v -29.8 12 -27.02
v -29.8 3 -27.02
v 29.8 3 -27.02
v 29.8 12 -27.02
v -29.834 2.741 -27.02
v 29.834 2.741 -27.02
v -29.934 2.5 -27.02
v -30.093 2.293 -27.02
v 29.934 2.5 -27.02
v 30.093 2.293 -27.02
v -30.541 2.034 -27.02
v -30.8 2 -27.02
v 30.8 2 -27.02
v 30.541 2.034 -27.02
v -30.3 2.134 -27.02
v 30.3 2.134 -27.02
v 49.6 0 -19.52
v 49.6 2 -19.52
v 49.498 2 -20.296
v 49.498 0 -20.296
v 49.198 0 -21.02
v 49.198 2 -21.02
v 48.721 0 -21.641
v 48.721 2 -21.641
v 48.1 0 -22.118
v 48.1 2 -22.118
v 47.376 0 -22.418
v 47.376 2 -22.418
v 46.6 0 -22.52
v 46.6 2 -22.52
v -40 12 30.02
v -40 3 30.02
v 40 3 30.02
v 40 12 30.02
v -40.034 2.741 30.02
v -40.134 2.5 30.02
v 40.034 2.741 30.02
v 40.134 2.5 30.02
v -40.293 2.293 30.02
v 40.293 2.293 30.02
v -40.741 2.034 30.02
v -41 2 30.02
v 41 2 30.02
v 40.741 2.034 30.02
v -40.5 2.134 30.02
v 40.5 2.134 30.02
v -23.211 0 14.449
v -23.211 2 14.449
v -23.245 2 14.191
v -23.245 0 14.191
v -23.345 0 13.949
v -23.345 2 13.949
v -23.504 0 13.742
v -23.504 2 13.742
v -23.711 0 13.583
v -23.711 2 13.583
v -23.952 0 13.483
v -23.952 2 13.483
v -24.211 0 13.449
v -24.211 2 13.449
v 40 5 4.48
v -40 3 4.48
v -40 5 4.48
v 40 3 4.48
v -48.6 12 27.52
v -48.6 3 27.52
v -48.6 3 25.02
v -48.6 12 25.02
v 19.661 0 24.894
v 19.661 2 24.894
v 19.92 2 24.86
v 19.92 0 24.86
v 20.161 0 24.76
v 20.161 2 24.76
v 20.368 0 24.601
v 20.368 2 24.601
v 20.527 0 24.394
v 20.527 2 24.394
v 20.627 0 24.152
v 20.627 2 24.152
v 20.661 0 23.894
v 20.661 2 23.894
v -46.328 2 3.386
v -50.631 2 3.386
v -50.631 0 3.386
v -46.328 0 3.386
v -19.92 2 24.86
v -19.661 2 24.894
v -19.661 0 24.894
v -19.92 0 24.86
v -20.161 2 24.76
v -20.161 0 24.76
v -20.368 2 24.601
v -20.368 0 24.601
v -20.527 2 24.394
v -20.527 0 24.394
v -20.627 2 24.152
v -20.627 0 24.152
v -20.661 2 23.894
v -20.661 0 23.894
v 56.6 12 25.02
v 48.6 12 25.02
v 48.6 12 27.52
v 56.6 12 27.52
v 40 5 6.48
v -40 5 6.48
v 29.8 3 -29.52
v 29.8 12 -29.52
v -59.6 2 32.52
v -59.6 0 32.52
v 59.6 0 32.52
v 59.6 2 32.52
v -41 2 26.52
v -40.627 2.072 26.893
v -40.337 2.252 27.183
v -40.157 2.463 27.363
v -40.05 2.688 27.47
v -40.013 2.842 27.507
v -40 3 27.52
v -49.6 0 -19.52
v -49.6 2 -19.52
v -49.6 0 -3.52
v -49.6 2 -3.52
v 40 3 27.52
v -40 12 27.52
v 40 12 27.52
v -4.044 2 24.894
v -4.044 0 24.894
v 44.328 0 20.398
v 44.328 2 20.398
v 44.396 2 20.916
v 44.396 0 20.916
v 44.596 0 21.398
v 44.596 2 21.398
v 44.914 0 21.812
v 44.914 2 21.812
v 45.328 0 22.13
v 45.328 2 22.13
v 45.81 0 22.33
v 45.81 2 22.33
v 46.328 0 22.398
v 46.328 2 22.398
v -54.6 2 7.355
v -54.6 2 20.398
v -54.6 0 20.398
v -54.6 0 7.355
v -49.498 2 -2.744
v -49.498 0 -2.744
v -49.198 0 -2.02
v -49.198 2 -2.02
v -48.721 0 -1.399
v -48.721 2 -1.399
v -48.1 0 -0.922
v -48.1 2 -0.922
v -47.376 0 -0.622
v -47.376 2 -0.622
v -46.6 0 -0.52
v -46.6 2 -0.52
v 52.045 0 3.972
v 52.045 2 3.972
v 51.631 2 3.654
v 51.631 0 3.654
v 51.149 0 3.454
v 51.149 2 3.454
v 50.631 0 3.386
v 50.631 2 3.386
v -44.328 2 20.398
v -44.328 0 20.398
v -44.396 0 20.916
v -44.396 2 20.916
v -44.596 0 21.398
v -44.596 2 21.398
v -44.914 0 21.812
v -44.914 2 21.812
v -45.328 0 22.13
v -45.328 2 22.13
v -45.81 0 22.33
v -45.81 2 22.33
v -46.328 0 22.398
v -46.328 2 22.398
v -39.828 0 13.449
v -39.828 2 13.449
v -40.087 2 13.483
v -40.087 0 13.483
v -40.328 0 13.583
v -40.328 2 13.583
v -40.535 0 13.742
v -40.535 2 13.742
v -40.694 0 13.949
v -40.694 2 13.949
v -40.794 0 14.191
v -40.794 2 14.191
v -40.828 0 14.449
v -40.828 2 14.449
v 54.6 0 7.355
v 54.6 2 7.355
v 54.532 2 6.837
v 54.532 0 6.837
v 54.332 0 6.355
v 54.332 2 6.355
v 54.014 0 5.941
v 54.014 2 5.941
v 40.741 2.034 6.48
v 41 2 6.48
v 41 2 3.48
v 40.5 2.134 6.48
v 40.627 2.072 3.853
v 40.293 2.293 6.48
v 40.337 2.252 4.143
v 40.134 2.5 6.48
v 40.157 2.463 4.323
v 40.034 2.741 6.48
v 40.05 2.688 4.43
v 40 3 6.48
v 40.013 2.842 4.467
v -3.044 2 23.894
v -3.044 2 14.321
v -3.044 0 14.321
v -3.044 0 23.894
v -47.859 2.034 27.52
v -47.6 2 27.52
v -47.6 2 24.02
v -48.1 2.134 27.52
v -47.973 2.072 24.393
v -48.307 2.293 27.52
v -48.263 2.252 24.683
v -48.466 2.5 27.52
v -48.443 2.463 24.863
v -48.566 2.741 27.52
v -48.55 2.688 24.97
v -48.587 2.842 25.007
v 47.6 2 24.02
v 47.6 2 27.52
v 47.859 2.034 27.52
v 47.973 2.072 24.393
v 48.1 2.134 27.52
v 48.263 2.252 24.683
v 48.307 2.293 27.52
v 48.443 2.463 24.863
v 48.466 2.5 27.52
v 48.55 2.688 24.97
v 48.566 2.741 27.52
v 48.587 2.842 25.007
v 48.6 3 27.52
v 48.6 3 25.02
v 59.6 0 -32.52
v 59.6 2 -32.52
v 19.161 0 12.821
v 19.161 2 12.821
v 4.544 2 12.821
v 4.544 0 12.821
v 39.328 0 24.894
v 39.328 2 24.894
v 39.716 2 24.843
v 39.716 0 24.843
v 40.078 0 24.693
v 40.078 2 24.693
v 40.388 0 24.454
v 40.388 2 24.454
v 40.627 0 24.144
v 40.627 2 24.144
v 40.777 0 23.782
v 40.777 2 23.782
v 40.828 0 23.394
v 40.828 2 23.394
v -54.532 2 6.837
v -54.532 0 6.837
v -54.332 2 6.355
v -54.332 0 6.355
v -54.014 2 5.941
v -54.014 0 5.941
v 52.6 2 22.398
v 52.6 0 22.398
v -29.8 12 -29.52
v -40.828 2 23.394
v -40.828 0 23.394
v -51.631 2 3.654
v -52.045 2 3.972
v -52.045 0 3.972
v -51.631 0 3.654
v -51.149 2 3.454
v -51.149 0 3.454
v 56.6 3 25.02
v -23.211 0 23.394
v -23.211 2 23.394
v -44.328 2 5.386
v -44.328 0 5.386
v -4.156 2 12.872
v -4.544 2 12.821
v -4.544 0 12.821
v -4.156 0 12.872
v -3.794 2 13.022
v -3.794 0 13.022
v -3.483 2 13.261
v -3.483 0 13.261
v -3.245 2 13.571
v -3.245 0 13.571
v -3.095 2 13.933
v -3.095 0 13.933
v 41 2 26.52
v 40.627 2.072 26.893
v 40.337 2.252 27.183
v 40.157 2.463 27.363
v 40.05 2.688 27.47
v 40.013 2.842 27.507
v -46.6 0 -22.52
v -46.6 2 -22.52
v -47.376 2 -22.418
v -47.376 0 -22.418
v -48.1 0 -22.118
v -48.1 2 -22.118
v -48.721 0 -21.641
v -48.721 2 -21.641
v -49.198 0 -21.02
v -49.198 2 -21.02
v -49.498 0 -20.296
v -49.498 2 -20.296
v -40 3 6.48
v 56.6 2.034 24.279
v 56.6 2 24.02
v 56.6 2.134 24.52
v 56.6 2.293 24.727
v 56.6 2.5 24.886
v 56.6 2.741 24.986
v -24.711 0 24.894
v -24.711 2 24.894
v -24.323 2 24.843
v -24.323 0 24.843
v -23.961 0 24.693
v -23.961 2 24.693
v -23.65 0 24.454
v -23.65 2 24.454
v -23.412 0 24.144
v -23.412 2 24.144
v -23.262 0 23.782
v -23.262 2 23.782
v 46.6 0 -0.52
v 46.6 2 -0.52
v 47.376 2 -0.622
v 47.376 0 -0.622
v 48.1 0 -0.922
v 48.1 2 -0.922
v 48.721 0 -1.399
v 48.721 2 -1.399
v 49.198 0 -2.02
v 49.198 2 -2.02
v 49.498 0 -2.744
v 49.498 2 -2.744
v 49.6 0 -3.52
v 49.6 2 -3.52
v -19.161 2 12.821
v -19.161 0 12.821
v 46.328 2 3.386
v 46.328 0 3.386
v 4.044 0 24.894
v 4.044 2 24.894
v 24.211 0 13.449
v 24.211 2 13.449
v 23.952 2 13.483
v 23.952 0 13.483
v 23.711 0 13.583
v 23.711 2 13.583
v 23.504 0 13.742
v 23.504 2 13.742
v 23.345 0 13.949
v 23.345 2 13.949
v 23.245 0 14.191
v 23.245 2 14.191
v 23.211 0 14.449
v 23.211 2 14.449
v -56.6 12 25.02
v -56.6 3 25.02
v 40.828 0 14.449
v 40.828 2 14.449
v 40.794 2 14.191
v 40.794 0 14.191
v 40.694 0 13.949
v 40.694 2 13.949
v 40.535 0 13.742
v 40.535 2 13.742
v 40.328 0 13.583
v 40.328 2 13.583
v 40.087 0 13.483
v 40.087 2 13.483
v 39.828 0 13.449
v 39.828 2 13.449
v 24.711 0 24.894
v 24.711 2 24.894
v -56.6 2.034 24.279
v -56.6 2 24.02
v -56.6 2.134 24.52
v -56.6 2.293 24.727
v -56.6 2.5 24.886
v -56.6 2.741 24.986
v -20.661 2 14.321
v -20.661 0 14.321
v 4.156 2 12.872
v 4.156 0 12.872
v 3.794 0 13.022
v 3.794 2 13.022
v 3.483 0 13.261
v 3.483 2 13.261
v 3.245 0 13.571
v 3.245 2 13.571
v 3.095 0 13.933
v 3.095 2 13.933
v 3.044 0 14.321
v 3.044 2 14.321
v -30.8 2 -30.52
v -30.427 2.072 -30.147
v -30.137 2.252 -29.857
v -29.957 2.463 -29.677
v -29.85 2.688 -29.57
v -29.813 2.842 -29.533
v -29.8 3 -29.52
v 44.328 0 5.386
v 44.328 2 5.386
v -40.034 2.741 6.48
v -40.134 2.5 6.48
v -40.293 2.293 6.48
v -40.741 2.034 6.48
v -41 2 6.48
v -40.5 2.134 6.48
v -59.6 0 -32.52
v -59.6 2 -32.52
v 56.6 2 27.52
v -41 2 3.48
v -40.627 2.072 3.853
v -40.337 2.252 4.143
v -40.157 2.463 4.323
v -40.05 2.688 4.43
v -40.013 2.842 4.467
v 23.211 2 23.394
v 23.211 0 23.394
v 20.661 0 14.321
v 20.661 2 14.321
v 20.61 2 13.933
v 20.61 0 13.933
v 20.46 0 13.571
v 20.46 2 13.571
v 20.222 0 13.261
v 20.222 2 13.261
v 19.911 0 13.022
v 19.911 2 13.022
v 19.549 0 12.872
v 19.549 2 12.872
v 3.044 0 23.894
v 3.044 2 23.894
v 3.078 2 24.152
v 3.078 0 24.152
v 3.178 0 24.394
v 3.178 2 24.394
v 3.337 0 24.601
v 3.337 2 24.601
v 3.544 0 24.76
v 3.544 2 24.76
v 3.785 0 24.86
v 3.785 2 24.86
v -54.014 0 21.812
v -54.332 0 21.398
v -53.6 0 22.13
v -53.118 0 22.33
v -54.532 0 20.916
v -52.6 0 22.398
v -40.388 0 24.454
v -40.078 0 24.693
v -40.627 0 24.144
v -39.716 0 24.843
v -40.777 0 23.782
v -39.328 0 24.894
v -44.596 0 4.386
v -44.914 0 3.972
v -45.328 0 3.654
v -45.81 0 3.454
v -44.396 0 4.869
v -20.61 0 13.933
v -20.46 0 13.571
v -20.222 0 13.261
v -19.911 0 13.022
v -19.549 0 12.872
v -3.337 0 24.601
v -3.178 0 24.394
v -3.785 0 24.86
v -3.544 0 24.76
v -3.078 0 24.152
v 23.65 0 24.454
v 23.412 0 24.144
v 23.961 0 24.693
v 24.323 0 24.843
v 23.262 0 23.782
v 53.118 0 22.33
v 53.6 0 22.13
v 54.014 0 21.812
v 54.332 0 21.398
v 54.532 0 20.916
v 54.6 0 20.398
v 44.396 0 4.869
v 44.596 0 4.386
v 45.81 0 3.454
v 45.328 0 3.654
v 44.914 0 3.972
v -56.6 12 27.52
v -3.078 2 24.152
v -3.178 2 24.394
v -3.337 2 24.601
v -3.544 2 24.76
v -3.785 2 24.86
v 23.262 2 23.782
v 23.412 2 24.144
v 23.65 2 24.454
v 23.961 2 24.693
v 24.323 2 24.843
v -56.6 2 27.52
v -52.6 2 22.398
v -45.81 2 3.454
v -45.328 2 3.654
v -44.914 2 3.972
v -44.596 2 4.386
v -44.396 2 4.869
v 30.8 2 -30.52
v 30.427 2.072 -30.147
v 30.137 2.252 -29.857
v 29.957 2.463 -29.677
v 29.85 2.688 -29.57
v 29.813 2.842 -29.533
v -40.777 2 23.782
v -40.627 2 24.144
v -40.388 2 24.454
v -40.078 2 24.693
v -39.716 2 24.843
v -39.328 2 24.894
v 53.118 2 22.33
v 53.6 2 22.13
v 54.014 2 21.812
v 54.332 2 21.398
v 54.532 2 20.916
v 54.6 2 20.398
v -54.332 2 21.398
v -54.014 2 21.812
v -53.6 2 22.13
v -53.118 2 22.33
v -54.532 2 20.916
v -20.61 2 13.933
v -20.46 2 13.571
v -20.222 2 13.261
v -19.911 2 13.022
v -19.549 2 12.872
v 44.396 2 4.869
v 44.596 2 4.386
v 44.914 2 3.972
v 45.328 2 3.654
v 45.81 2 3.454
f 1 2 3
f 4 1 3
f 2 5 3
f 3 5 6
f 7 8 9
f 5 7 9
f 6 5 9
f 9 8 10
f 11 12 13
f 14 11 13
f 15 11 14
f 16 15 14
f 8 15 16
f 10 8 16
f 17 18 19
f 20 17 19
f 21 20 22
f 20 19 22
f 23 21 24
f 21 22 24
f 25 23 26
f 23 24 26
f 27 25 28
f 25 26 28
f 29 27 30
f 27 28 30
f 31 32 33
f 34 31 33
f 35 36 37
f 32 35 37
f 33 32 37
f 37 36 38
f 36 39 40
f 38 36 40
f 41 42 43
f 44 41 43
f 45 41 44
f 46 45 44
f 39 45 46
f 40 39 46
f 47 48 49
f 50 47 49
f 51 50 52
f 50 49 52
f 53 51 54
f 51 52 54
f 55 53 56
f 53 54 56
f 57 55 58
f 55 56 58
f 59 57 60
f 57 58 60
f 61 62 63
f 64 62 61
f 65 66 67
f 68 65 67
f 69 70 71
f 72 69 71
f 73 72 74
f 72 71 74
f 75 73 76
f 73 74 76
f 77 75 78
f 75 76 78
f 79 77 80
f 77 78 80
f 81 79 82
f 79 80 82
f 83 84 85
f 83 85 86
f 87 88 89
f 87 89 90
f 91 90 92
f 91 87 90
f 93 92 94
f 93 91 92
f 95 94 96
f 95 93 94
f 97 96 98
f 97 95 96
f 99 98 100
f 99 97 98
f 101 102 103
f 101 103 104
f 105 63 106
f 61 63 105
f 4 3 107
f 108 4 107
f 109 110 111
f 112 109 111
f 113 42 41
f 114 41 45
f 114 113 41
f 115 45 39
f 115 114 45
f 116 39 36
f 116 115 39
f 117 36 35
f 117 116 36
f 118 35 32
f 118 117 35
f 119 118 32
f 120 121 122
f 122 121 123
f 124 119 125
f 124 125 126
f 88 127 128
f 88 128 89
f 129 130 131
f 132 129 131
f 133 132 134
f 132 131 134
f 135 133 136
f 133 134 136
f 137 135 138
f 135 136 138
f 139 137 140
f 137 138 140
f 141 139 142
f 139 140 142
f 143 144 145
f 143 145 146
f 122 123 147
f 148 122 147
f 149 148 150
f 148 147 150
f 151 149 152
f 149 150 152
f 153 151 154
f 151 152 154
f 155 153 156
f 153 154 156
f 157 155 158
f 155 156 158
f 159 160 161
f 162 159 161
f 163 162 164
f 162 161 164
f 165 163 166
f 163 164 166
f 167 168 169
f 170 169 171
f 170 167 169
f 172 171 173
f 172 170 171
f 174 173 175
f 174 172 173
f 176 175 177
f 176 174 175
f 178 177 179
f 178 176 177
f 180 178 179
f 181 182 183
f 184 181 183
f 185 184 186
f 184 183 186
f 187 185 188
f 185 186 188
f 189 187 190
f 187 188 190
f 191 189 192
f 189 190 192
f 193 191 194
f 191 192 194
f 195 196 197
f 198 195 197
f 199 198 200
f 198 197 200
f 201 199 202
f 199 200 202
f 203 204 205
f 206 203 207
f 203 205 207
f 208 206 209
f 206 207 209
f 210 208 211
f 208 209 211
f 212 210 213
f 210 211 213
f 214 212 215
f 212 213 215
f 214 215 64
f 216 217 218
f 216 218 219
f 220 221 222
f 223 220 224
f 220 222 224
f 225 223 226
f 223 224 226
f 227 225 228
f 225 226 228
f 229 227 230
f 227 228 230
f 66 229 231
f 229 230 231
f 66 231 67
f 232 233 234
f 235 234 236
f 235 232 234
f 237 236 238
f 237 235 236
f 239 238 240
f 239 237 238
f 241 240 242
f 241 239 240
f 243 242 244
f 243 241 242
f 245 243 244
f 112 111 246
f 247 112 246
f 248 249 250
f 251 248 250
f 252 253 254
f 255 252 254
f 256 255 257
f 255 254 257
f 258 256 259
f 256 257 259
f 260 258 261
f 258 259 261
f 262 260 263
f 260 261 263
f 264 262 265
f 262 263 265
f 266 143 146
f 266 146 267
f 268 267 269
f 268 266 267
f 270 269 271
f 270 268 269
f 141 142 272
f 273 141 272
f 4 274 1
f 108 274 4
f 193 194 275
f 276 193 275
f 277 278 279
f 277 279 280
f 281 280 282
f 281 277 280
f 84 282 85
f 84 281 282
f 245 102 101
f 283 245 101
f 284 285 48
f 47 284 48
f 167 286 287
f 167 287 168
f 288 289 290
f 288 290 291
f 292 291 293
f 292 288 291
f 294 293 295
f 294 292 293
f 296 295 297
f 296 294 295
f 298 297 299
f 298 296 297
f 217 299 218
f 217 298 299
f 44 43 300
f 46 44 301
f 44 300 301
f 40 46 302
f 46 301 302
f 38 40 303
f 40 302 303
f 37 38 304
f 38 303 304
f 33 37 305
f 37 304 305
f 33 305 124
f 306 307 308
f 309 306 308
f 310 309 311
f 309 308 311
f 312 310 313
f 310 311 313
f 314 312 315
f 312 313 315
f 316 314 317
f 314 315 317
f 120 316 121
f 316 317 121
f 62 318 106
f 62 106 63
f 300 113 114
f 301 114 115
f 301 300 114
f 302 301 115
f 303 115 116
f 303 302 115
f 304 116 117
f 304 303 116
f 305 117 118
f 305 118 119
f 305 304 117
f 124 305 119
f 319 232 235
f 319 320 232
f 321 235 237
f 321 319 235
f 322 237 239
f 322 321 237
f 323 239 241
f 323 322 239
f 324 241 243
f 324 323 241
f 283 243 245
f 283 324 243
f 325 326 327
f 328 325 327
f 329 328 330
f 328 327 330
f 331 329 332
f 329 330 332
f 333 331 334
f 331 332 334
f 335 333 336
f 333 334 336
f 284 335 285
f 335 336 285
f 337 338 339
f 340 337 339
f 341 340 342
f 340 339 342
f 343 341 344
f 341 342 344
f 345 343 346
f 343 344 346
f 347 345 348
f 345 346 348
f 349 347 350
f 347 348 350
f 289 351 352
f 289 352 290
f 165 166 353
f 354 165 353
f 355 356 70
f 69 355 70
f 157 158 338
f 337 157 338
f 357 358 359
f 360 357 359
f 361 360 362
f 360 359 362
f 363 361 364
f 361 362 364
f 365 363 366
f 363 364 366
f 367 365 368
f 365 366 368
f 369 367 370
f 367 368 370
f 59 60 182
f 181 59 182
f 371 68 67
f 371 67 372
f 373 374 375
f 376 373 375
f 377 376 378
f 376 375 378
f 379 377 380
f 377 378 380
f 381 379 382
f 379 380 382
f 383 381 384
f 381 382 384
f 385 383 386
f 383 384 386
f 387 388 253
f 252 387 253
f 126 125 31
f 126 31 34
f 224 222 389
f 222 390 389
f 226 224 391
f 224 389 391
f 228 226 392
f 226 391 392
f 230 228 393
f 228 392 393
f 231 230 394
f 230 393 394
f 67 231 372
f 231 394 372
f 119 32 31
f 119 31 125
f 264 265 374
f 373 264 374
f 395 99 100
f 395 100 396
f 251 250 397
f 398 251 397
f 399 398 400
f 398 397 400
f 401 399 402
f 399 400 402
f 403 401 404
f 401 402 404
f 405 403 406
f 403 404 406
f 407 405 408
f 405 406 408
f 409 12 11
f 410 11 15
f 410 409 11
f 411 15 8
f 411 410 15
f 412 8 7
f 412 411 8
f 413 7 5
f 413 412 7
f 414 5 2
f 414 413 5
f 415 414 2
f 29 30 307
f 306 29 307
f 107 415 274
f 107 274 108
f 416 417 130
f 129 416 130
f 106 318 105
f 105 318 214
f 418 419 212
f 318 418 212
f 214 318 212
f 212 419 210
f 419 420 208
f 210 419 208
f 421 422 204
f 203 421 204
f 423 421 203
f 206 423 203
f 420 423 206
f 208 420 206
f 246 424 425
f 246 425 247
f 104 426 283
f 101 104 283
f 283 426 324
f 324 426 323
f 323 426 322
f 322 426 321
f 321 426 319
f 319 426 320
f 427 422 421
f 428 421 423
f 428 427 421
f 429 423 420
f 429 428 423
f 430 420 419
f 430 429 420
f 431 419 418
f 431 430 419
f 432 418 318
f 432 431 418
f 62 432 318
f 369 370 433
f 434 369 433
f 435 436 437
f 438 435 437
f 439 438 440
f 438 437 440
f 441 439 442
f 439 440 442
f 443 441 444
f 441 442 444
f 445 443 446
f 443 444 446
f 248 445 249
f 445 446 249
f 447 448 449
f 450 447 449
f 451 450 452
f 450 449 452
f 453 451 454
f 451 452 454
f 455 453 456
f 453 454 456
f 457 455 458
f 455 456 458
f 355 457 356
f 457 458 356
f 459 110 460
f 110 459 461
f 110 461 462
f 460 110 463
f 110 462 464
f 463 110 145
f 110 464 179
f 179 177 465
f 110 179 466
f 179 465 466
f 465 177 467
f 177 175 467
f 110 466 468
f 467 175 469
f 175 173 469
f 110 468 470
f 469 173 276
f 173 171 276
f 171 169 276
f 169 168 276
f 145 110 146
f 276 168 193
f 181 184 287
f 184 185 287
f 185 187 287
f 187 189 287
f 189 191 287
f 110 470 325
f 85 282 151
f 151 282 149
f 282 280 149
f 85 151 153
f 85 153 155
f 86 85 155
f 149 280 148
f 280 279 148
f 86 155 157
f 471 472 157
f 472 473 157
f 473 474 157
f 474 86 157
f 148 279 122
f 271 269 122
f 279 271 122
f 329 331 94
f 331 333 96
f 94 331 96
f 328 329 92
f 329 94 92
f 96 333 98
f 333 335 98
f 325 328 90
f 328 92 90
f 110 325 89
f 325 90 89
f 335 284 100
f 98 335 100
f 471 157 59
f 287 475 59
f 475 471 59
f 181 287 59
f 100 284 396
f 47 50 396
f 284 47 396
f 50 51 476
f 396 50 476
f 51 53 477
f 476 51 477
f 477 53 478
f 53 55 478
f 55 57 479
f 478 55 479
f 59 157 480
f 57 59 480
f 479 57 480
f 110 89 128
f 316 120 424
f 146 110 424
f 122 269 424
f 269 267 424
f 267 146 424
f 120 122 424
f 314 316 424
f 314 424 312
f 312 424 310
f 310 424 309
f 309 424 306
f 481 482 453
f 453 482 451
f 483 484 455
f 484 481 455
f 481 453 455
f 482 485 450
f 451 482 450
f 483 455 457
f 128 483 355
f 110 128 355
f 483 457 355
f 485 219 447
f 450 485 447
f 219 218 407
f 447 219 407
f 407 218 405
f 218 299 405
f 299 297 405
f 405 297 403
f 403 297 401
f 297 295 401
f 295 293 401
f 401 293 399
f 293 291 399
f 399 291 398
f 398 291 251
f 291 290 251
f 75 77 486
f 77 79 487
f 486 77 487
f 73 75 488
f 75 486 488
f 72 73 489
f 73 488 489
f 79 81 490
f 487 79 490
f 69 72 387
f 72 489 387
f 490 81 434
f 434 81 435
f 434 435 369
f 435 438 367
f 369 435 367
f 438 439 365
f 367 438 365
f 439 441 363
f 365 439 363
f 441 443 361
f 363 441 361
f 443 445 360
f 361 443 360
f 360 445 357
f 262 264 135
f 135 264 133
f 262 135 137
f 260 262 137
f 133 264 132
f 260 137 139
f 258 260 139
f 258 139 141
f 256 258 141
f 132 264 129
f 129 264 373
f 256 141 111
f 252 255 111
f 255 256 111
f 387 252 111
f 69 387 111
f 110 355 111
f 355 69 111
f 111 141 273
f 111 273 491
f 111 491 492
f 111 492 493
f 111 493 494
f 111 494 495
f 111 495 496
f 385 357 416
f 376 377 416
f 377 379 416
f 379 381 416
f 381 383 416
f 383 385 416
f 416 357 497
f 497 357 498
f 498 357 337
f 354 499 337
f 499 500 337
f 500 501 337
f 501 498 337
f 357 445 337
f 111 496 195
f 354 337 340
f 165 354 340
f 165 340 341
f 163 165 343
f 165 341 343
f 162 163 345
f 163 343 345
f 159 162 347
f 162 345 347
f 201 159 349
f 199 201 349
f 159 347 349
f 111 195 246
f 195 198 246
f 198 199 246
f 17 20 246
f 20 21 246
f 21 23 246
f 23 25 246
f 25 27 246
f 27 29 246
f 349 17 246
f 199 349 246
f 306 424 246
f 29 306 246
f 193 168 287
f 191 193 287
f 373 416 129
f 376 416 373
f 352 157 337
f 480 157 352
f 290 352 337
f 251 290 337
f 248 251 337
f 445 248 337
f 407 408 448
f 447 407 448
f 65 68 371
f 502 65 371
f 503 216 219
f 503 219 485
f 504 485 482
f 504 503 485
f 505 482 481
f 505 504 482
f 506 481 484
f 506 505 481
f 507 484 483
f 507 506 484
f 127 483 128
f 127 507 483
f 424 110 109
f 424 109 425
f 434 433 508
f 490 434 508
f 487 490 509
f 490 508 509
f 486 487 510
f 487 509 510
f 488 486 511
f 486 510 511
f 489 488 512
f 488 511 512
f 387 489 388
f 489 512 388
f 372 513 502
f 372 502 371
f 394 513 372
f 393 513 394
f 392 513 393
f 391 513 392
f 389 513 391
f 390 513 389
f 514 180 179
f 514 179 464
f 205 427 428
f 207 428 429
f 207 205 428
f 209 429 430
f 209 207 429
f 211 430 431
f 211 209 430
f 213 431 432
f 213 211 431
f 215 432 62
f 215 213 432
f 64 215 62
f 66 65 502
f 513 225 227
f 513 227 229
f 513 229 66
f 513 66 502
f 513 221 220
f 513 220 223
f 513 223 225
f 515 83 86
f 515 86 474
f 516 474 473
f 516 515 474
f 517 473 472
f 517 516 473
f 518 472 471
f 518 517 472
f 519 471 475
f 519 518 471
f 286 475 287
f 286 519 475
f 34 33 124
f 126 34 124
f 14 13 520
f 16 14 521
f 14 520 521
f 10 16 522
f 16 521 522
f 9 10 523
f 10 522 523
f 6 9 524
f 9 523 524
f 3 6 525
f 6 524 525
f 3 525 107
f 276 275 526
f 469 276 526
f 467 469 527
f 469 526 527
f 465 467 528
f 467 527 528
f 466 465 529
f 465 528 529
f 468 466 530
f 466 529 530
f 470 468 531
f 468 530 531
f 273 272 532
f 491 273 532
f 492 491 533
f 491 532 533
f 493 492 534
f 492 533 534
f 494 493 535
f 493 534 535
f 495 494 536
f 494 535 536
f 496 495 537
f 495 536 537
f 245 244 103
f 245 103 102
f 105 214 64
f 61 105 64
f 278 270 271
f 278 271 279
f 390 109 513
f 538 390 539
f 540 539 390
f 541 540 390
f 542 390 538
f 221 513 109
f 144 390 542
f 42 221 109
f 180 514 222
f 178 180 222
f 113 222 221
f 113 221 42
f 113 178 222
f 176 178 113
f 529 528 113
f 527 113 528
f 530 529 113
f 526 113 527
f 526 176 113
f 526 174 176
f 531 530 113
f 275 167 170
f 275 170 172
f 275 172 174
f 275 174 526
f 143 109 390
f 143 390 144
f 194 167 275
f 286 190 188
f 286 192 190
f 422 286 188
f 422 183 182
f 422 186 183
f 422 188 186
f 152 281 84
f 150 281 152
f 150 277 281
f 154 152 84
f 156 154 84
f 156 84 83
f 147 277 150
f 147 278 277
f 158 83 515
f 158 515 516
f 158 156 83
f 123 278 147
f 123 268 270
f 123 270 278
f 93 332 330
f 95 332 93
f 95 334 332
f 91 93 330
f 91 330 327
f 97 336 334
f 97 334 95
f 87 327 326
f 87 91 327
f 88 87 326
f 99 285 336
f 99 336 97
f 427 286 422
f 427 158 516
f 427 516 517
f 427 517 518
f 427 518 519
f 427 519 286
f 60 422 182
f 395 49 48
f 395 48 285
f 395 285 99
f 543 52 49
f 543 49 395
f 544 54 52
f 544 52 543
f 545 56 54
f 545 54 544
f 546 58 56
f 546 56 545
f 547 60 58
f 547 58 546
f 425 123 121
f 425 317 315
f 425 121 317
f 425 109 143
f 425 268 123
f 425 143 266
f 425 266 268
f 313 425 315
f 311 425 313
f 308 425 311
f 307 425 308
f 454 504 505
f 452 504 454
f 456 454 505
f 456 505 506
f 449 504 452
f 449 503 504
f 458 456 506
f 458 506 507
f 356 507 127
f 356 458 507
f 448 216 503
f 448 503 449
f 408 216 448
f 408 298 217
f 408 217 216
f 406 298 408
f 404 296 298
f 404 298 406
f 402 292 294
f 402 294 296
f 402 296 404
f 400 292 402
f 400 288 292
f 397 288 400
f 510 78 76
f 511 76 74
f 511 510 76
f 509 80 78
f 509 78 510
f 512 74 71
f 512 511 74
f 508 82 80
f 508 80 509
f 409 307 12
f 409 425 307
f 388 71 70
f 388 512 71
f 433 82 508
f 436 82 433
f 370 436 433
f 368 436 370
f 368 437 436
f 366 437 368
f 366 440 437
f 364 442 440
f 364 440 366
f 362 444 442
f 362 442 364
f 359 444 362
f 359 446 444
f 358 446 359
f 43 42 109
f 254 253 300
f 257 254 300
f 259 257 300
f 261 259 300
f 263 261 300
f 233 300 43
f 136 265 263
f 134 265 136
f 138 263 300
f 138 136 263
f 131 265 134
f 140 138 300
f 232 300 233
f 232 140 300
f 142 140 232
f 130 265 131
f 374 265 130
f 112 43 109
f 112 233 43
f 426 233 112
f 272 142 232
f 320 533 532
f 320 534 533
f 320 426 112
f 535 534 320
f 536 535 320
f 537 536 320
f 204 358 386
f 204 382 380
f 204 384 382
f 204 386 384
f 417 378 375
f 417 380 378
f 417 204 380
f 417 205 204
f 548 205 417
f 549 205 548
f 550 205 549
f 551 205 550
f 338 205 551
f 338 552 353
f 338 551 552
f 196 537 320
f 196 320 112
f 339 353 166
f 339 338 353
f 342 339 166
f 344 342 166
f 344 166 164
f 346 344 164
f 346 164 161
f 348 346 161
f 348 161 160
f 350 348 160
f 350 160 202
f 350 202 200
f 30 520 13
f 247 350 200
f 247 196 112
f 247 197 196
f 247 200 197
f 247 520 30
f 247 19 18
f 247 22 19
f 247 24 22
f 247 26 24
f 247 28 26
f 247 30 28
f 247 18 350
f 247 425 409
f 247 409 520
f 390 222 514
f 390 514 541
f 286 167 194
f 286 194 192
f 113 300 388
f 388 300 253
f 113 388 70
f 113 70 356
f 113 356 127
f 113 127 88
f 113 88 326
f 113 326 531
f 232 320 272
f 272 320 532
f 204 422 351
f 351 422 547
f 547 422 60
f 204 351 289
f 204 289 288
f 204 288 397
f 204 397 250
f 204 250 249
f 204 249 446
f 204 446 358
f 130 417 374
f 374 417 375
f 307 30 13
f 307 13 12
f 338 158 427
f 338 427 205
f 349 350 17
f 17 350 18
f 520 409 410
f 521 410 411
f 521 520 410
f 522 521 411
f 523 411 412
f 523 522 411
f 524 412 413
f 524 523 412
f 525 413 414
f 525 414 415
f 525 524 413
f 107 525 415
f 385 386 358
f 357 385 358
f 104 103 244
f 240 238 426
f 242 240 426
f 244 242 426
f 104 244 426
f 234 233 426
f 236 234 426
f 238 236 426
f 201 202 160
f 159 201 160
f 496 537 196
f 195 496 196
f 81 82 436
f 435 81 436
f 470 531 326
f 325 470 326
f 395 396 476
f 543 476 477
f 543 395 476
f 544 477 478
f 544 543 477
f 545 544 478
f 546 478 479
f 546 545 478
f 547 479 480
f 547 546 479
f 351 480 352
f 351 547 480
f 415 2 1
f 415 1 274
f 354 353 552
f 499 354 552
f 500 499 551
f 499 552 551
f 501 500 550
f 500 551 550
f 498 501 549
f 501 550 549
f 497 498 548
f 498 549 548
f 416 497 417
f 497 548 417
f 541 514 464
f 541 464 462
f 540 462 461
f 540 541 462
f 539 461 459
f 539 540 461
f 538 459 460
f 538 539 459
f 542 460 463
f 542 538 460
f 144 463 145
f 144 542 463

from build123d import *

# Parameters (mm, degrees)
SKETCH1_W           = 119.2
SKETCH1_H           = 65.04
BOSS_EXTRUDE1_DEPTH = 2
SKETCH2_W           = 59.6
SKETCH2_H           = 2.5
SKETCH2_W_2         = 80
SKETCH2_H_2         = 2
BOSS_EXTRUDE2_DEPTH = 10
FILLET1_R           = 1
SKETCH3_W           = 80
SKETCH3_H           = 2
CUT_EXTRUDE1_DEPTH  = 7
SKETCH4_W           = 80
SKETCH4_H           = 2.5
SKETCH4_W_2         = 8
BOSS_EXTRUDE3_DEPTH = 10
FILLET2_R           = 1
FILLET3_R           = 1
CUT_EXTRUDE2_DEPTH  = 10
CUT_EXTRUDE3_DEPTH  = 10


with BuildPart() as part:
    # Sketch1 → Boss-Extrude1 (new body)
    with BuildSketch(Plane(origin=(0, 0, 0), x_dir=(1, 0, 0), z_dir=(0, 1, 0))):
        Rectangle(SKETCH1_W, SKETCH1_H)
    extrude(amount=BOSS_EXTRUDE1_DEPTH)

    # Sketch2 → Boss-Extrude2 (add)
    with BuildSketch(Plane(origin=(0, 2, 0), x_dir=(1, 0, 0), z_dir=(0, 1, 0))):
        with Locations((0, 28.27)):
            Rectangle(SKETCH2_W, SKETCH2_H)
        with Locations((0, -5.48)):
            Rectangle(SKETCH2_W_2, SKETCH2_H_2)
    extrude(amount=BOSS_EXTRUDE2_DEPTH)

    # Fillet1
    fillet1_edges = [part.edges().sort_by_distance(p)[0] for p in [
        (40, 2, 5.48),
        (0, 2, 4.48),
        (-40, 2, 5.48),
        (-29.8, 2, -28.27),
        (29.8, 2, -28.27),
        (0, 2, -29.52),
    ]]
    fillet(fillet1_edges, radius=FILLET1_R)

    # Sketch3 → Cut-Extrude1 (cut)
    with BuildSketch(Plane(origin=(0, 12, 0), x_dir=(1, 0, 0), z_dir=(0, 1, 0))):
        with Locations((0, -5.48)):
            Rectangle(SKETCH3_W, SKETCH3_H)
        with Locations((0, -9.48)):
            Rectangle(SKETCH3_W, SKETCH3_H)
    extrude(amount=-CUT_EXTRUDE1_DEPTH, mode=Mode.SUBTRACT)

    # Sketch4 → Boss-Extrude3 (add)
    with BuildSketch(Plane(origin=(0, 2, 0), x_dir=(1, 0, 0), z_dir=(0, 1, 0))):
        with Locations((0, -28.77)):
            Rectangle(SKETCH4_W, SKETCH4_H)
        with Locations((52.6, -26.27)):
            Rectangle(SKETCH4_W_2, SKETCH4_H)
    boss_extrude3 = extrude(amount=BOSS_EXTRUDE3_DEPTH)

    # Fillet2
    fillet2_edges = [part.edges().sort_by_distance(p)[0] for p in [
        (-40, 2, 28.77),
        (48.6, 2, 26.27),
        (52.6, 2, 25.02),
        (40, 2, 28.77),
        (0, 2, 27.52),
    ]]
    fillet(fillet2_edges, radius=FILLET2_R)

    # Mirror1: Boss-Extrude3 across plane
    add(boss_extrude3.mirror(Plane.ZY))

    # Fillet3
    fillet3_edges = [part.edges().sort_by_distance(p)[0] for p in [
        (-48.6, 2, 26.27),
        (-52.6, 2, 25.02),
    ]]
    fillet(fillet3_edges, radius=FILLET3_R)

    # Sketch5 → Cut-Extrude2 (cut)
    with BuildSketch(Plane(origin=(0, 2, 0), x_dir=(1, 0, 0), z_dir=(0, 1, 0))):
        with BuildLine():
            Line((46.6, 22.52), (6.311514948, 22.52))
            Line((6.311514948, 22.52), (-46.6, 22.52))
            ThreePointArc((-46.6, 22.52), (-48.721320344, 21.641320344), (-49.6, 19.52))
            Line((-49.6, 19.52), (-49.6, 3.52))
            ThreePointArc((-49.6, 3.52), (-48.721320344, 1.398679656), (-46.6, 0.52))
            Line((-46.6, 0.52), (46.6, 0.52))
            ThreePointArc((46.6, 0.52), (48.721320344, 1.398679656), (49.6, 3.52))
            Line((49.6, 3.52), (49.6, 19.52))
            ThreePointArc((49.6, 19.52), (48.721320344, 21.641320344), (46.6, 22.52))
        make_face()
    extrude(amount=-CUT_EXTRUDE2_DEPTH, mode=Mode.SUBTRACT)

    # Sketch6 → Cut-Extrude3 (cut)
    with BuildSketch(Plane(origin=(0, 2, 0), x_dir=(1, 0, 0), z_dir=(0, 1, 0))):
        with BuildLine():
            Line((54.014213562, -5.94084617), (52.045315698, -3.971948306))
            ThreePointArc((52.045315698, -3.971948306), (51.396469, -3.538402803), (50.631102135, -3.386161868))
            Line((50.631102135, -3.386161868), (46.32782558, -3.386161868))
            ThreePointArc((46.32782558, -3.386161868), (44.913612017, -3.971948306), (44.32782558, -5.386161868))
            Line((44.32782558, -5.386161868), (44.32782558, -20.397912268))
            ThreePointArc((44.32782558, -20.397912268), (44.913612017, -21.812125831), (46.32782558, -22.397912268))
            Line((46.32782558, -22.397912268), (52.6, -22.397912268))
            ThreePointArc((52.6, -22.397912268), (54.014213562, -21.812125831), (54.6, -20.397912268))
            Line((54.6, -20.397912268), (54.6, -7.355059733))
            ThreePointArc((54.6, -7.355059733), (54.447759065, -6.589692868), (54.014213562, -5.94084617))
        make_face()
        with BuildLine():
            Line((39.82782558, -13.44932419), (24.210760832, -13.44932419))
            ThreePointArc((24.210760832, -13.44932419), (23.503654051, -13.742217409), (23.210760832, -14.44932419))
            Line((23.210760832, -14.44932419), (23.210760832, -23.393622011))
            ThreePointArc((23.210760832, -23.393622011), (23.650100661, -24.454282183), (24.710760832, -24.893622011))
            Line((24.710760832, -24.893622011), (39.32782558, -24.893622011))
            ThreePointArc((39.32782558, -24.893622011), (40.388485752, -24.454282183), (40.82782558, -23.393622011))
            Line((40.82782558, -23.393622011), (40.82782558, -14.44932419))
            ThreePointArc((40.82782558, -14.44932419), (40.534932361, -13.742217409), (39.82782558, -13.44932419))
        make_face()
        with BuildLine():
            Line((4.043952302, -24.893622011), (19.660852384, -24.893622011))
            ThreePointArc((19.660852384, -24.893622011), (20.367959165, -24.600728792), (20.660852384, -23.893622011))
            Line((20.660852384, -23.893622011), (20.660852384, -14.321364431))
            ThreePointArc((20.660852384, -14.321364431), (20.221512556, -13.260704259), (19.160852384, -12.821364431))
            Line((19.160852384, -12.821364431), (4.543952302, -12.821364431))
            ThreePointArc((4.543952302, -12.821364431), (3.48329213, -13.260704259), (3.043952302, -14.321364431))
            Line((3.043952302, -14.321364431), (3.043952302, -23.893622011))
            ThreePointArc((3.043952302, -23.893622011), (3.336845521, -24.600728792), (4.043952302, -24.893622011))
        make_face()
        with BuildLine():
            Line((-4.043952302, -24.893622011), (-19.660852384, -24.893622011))
            ThreePointArc((-19.660852384, -24.893622011), (-20.367959165, -24.600728792), (-20.660852384, -23.893622011))
            Line((-20.660852384, -23.893622011), (-20.660852384, -14.321364431))
            ThreePointArc((-20.660852384, -14.321364431), (-20.221512556, -13.260704259), (-19.160852384, -12.821364431))
            Line((-19.160852384, -12.821364431), (-4.543952302, -12.821364431))
            ThreePointArc((-4.543952302, -12.821364431), (-3.48329213, -13.260704259), (-3.043952302, -14.321364431))
            Line((-3.043952302, -14.321364431), (-3.043952302, -23.893622011))
            ThreePointArc((-3.043952302, -23.893622011), (-3.336845521, -24.600728792), (-4.043952302, -24.893622011))
        make_face()
        with BuildLine():
            Line((-39.32782558, -24.893622011), (-24.710760832, -24.893622011))
            ThreePointArc((-24.710760832, -24.893622011), (-23.650100661, -24.454282183), (-23.210760832, -23.393622011))
            Line((-23.210760832, -23.393622011), (-23.210760832, -14.44932419))
            ThreePointArc((-23.210760832, -14.44932419), (-23.503654051, -13.742217409), (-24.210760832, -13.44932419))
            Line((-24.210760832, -13.44932419), (-39.82782558, -13.44932419))
            ThreePointArc((-39.82782558, -13.44932419), (-40.534932361, -13.742217409), (-40.82782558, -14.44932419))
            Line((-40.82782558, -14.44932419), (-40.82782558, -23.393622011))
            ThreePointArc((-40.82782558, -23.393622011), (-40.388485752, -24.454282183), (-39.32782558, -24.893622011))
        make_face()
        with BuildLine():
            Line((-44.32782558, -5.386161868), (-44.32782558, -20.397912268))
            ThreePointArc((-44.32782558, -20.397912268), (-44.913612017, -21.812125831), (-46.32782558, -22.397912268))
            Line((-46.32782558, -22.397912268), (-52.6, -22.397912268))
            ThreePointArc((-52.6, -22.397912268), (-54.014213562, -21.812125831), (-54.6, -20.397912268))
            Line((-54.6, -20.397912268), (-54.6, -7.355059733))
            ThreePointArc((-54.6, -7.355059733), (-54.447759065, -6.589692868), (-54.014213562, -5.94084617))
            Line((-54.014213562, -5.94084617), (-52.045315698, -3.971948306))
            ThreePointArc((-52.045315698, -3.971948306), (-51.396469, -3.538402803), (-50.631102135, -3.386161868))
            Line((-50.631102135, -3.386161868), (-46.32782558, -3.386161868))
            ThreePointArc((-46.32782558, -3.386161868), (-44.913612017, -3.971948306), (-44.32782558, -5.386161868))
        make_face()
    extrude(amount=-CUT_EXTRUDE3_DEPTH, mode=Mode.SUBTRACT)


solid = part.part
